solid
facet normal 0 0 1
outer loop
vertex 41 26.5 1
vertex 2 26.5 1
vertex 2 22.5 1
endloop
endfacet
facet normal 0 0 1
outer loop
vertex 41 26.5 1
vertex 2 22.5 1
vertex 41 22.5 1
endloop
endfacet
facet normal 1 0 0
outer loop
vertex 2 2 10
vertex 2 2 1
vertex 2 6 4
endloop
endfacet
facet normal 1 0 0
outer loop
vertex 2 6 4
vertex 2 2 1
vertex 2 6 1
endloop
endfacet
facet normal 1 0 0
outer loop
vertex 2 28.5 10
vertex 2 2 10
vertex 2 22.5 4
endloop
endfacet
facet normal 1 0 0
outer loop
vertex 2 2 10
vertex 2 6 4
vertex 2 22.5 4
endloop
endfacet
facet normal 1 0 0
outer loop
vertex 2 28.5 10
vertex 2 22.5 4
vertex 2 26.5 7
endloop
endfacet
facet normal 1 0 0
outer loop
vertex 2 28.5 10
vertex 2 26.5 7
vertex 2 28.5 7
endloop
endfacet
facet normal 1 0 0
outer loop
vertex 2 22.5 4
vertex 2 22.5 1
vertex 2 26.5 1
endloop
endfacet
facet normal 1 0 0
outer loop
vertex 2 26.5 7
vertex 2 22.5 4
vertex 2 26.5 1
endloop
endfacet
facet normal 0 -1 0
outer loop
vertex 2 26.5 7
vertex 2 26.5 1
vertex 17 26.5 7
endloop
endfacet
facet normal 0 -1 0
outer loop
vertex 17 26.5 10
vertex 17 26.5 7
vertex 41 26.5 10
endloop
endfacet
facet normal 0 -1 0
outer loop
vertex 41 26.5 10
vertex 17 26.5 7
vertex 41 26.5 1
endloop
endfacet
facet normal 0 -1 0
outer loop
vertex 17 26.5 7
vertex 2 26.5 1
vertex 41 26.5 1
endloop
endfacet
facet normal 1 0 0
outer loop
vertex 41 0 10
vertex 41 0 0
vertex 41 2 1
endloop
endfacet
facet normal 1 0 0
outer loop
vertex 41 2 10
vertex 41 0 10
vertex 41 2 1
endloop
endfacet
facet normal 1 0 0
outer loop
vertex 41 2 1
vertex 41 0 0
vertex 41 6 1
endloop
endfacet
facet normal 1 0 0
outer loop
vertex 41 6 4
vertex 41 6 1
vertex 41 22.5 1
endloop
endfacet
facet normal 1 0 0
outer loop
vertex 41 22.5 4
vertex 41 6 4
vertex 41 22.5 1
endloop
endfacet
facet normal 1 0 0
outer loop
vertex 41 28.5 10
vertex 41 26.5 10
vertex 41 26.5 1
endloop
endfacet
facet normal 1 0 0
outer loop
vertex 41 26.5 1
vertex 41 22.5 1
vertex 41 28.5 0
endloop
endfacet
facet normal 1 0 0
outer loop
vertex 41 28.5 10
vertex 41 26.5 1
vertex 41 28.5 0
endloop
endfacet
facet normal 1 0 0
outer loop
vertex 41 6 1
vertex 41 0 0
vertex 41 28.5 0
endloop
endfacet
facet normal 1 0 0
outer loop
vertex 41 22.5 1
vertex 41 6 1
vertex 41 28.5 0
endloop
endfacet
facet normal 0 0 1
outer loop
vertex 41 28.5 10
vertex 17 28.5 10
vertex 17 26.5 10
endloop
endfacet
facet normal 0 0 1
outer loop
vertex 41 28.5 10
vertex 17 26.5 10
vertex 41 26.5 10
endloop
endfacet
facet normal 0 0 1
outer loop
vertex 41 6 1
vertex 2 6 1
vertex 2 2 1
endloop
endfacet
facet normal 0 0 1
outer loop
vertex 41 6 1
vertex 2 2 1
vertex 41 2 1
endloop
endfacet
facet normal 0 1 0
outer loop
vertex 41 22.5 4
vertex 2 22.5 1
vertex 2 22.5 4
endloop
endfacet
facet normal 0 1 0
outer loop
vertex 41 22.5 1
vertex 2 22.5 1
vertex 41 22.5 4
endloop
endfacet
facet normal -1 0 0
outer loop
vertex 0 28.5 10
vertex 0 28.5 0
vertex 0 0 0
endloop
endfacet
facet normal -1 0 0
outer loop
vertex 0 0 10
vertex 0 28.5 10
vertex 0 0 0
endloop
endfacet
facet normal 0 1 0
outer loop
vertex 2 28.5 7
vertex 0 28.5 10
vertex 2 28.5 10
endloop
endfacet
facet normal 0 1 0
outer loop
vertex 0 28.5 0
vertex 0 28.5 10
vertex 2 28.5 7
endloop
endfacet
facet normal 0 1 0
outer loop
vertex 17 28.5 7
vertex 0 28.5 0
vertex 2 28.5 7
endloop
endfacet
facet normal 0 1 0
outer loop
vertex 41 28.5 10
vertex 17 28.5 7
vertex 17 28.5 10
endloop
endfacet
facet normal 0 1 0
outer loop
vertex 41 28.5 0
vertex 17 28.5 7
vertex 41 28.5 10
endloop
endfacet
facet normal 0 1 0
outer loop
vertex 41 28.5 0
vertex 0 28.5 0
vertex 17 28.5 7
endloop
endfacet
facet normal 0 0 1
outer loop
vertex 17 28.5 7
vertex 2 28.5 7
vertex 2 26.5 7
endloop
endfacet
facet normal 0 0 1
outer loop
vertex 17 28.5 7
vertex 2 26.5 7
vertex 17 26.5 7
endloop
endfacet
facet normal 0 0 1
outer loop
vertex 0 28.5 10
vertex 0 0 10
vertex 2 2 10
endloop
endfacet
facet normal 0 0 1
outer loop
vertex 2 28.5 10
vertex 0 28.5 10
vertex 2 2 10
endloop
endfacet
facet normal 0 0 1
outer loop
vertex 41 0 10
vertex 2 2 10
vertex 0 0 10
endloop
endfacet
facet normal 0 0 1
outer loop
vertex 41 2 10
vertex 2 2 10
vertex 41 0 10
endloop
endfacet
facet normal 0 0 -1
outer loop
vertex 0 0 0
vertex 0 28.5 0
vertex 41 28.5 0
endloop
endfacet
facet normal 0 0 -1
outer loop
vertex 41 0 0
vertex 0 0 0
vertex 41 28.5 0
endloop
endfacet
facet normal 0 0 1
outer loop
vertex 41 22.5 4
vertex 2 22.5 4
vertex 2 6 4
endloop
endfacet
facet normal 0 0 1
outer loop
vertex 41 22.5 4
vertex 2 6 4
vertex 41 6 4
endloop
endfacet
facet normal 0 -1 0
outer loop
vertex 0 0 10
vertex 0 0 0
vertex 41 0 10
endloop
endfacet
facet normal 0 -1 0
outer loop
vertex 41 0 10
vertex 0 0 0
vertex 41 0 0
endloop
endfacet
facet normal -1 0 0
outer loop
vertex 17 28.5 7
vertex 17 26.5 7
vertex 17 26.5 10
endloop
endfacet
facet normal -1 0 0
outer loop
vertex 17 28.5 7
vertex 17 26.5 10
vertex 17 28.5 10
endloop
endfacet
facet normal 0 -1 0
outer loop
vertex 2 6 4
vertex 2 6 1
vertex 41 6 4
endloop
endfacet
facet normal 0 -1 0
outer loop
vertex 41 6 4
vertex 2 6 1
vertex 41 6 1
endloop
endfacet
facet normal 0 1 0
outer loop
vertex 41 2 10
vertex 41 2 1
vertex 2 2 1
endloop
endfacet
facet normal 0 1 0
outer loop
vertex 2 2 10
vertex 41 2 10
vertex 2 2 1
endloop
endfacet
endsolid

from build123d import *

# Parameters (mm, degrees)
F1_DEPTH = 1
F0_W     = 39
F0_H     = 4
F0_H_2   = 16.5
F2_DEPTH = 4
F0_W_2   = 15
F0_H_3   = 2
F3_DEPTH = 7
F0_W_3   = 24
F4_DEPTH = 10


# Not quite as in the source:
# - a feature names something its author has since deleted; it is built from what else it names


with BuildPart() as f1:
    # F0 (on Top) → F1 (new body)
    with BuildSketch(Plane.XY):
        Polygon((17, 26.5), (2, 26.5), (2, 22.5), (41, 22.5), (41, 26.5), align=None)
    extrude(amount=F1_DEPTH)



with BuildPart() as f1b:
    # F0 (on Top) → F1, piece 2 (new body)
    with BuildSketch(Plane.XY):
        with Locations((21.5, 4)):
            Rectangle(F0_W, F0_H)
    extrude(amount=F1_DEPTH)


with BuildPart() as f1_1:
    add(f1.part)

    add(f1b.part)  # F2 merges F1b
    # F0 (on Top) → F2 (join)
    with BuildSketch(Plane.XY):
        with Locations((21.5, 14.25)):
            Rectangle(F0_W, F0_H_2)
    extrude(amount=F2_DEPTH)

    # F0 (on Top) → F3 (join)
    with BuildSketch(Plane.XY):
        with Locations((9.5, 27.5)):
            Rectangle(F0_W_2, F0_H_3)
    extrude(amount=F3_DEPTH)

    # F0 (on Top) → F4 (join)
    with BuildSketch(Plane.XY):
        with Locations((29, 27.5)):
            Rectangle(F0_W_3, F0_H_3)
        Polygon((2, 22.5), (2, 26.5), (2, 28.5), (0, 28.5), (0, 2), (2, 2), (2, 6), align=None)
        Polygon((41, 2), (2, 2), (0, 2), (0, 0), (41, 0), align=None)
    extrude(amount=F4_DEPTH)


solid = f1_1.part
